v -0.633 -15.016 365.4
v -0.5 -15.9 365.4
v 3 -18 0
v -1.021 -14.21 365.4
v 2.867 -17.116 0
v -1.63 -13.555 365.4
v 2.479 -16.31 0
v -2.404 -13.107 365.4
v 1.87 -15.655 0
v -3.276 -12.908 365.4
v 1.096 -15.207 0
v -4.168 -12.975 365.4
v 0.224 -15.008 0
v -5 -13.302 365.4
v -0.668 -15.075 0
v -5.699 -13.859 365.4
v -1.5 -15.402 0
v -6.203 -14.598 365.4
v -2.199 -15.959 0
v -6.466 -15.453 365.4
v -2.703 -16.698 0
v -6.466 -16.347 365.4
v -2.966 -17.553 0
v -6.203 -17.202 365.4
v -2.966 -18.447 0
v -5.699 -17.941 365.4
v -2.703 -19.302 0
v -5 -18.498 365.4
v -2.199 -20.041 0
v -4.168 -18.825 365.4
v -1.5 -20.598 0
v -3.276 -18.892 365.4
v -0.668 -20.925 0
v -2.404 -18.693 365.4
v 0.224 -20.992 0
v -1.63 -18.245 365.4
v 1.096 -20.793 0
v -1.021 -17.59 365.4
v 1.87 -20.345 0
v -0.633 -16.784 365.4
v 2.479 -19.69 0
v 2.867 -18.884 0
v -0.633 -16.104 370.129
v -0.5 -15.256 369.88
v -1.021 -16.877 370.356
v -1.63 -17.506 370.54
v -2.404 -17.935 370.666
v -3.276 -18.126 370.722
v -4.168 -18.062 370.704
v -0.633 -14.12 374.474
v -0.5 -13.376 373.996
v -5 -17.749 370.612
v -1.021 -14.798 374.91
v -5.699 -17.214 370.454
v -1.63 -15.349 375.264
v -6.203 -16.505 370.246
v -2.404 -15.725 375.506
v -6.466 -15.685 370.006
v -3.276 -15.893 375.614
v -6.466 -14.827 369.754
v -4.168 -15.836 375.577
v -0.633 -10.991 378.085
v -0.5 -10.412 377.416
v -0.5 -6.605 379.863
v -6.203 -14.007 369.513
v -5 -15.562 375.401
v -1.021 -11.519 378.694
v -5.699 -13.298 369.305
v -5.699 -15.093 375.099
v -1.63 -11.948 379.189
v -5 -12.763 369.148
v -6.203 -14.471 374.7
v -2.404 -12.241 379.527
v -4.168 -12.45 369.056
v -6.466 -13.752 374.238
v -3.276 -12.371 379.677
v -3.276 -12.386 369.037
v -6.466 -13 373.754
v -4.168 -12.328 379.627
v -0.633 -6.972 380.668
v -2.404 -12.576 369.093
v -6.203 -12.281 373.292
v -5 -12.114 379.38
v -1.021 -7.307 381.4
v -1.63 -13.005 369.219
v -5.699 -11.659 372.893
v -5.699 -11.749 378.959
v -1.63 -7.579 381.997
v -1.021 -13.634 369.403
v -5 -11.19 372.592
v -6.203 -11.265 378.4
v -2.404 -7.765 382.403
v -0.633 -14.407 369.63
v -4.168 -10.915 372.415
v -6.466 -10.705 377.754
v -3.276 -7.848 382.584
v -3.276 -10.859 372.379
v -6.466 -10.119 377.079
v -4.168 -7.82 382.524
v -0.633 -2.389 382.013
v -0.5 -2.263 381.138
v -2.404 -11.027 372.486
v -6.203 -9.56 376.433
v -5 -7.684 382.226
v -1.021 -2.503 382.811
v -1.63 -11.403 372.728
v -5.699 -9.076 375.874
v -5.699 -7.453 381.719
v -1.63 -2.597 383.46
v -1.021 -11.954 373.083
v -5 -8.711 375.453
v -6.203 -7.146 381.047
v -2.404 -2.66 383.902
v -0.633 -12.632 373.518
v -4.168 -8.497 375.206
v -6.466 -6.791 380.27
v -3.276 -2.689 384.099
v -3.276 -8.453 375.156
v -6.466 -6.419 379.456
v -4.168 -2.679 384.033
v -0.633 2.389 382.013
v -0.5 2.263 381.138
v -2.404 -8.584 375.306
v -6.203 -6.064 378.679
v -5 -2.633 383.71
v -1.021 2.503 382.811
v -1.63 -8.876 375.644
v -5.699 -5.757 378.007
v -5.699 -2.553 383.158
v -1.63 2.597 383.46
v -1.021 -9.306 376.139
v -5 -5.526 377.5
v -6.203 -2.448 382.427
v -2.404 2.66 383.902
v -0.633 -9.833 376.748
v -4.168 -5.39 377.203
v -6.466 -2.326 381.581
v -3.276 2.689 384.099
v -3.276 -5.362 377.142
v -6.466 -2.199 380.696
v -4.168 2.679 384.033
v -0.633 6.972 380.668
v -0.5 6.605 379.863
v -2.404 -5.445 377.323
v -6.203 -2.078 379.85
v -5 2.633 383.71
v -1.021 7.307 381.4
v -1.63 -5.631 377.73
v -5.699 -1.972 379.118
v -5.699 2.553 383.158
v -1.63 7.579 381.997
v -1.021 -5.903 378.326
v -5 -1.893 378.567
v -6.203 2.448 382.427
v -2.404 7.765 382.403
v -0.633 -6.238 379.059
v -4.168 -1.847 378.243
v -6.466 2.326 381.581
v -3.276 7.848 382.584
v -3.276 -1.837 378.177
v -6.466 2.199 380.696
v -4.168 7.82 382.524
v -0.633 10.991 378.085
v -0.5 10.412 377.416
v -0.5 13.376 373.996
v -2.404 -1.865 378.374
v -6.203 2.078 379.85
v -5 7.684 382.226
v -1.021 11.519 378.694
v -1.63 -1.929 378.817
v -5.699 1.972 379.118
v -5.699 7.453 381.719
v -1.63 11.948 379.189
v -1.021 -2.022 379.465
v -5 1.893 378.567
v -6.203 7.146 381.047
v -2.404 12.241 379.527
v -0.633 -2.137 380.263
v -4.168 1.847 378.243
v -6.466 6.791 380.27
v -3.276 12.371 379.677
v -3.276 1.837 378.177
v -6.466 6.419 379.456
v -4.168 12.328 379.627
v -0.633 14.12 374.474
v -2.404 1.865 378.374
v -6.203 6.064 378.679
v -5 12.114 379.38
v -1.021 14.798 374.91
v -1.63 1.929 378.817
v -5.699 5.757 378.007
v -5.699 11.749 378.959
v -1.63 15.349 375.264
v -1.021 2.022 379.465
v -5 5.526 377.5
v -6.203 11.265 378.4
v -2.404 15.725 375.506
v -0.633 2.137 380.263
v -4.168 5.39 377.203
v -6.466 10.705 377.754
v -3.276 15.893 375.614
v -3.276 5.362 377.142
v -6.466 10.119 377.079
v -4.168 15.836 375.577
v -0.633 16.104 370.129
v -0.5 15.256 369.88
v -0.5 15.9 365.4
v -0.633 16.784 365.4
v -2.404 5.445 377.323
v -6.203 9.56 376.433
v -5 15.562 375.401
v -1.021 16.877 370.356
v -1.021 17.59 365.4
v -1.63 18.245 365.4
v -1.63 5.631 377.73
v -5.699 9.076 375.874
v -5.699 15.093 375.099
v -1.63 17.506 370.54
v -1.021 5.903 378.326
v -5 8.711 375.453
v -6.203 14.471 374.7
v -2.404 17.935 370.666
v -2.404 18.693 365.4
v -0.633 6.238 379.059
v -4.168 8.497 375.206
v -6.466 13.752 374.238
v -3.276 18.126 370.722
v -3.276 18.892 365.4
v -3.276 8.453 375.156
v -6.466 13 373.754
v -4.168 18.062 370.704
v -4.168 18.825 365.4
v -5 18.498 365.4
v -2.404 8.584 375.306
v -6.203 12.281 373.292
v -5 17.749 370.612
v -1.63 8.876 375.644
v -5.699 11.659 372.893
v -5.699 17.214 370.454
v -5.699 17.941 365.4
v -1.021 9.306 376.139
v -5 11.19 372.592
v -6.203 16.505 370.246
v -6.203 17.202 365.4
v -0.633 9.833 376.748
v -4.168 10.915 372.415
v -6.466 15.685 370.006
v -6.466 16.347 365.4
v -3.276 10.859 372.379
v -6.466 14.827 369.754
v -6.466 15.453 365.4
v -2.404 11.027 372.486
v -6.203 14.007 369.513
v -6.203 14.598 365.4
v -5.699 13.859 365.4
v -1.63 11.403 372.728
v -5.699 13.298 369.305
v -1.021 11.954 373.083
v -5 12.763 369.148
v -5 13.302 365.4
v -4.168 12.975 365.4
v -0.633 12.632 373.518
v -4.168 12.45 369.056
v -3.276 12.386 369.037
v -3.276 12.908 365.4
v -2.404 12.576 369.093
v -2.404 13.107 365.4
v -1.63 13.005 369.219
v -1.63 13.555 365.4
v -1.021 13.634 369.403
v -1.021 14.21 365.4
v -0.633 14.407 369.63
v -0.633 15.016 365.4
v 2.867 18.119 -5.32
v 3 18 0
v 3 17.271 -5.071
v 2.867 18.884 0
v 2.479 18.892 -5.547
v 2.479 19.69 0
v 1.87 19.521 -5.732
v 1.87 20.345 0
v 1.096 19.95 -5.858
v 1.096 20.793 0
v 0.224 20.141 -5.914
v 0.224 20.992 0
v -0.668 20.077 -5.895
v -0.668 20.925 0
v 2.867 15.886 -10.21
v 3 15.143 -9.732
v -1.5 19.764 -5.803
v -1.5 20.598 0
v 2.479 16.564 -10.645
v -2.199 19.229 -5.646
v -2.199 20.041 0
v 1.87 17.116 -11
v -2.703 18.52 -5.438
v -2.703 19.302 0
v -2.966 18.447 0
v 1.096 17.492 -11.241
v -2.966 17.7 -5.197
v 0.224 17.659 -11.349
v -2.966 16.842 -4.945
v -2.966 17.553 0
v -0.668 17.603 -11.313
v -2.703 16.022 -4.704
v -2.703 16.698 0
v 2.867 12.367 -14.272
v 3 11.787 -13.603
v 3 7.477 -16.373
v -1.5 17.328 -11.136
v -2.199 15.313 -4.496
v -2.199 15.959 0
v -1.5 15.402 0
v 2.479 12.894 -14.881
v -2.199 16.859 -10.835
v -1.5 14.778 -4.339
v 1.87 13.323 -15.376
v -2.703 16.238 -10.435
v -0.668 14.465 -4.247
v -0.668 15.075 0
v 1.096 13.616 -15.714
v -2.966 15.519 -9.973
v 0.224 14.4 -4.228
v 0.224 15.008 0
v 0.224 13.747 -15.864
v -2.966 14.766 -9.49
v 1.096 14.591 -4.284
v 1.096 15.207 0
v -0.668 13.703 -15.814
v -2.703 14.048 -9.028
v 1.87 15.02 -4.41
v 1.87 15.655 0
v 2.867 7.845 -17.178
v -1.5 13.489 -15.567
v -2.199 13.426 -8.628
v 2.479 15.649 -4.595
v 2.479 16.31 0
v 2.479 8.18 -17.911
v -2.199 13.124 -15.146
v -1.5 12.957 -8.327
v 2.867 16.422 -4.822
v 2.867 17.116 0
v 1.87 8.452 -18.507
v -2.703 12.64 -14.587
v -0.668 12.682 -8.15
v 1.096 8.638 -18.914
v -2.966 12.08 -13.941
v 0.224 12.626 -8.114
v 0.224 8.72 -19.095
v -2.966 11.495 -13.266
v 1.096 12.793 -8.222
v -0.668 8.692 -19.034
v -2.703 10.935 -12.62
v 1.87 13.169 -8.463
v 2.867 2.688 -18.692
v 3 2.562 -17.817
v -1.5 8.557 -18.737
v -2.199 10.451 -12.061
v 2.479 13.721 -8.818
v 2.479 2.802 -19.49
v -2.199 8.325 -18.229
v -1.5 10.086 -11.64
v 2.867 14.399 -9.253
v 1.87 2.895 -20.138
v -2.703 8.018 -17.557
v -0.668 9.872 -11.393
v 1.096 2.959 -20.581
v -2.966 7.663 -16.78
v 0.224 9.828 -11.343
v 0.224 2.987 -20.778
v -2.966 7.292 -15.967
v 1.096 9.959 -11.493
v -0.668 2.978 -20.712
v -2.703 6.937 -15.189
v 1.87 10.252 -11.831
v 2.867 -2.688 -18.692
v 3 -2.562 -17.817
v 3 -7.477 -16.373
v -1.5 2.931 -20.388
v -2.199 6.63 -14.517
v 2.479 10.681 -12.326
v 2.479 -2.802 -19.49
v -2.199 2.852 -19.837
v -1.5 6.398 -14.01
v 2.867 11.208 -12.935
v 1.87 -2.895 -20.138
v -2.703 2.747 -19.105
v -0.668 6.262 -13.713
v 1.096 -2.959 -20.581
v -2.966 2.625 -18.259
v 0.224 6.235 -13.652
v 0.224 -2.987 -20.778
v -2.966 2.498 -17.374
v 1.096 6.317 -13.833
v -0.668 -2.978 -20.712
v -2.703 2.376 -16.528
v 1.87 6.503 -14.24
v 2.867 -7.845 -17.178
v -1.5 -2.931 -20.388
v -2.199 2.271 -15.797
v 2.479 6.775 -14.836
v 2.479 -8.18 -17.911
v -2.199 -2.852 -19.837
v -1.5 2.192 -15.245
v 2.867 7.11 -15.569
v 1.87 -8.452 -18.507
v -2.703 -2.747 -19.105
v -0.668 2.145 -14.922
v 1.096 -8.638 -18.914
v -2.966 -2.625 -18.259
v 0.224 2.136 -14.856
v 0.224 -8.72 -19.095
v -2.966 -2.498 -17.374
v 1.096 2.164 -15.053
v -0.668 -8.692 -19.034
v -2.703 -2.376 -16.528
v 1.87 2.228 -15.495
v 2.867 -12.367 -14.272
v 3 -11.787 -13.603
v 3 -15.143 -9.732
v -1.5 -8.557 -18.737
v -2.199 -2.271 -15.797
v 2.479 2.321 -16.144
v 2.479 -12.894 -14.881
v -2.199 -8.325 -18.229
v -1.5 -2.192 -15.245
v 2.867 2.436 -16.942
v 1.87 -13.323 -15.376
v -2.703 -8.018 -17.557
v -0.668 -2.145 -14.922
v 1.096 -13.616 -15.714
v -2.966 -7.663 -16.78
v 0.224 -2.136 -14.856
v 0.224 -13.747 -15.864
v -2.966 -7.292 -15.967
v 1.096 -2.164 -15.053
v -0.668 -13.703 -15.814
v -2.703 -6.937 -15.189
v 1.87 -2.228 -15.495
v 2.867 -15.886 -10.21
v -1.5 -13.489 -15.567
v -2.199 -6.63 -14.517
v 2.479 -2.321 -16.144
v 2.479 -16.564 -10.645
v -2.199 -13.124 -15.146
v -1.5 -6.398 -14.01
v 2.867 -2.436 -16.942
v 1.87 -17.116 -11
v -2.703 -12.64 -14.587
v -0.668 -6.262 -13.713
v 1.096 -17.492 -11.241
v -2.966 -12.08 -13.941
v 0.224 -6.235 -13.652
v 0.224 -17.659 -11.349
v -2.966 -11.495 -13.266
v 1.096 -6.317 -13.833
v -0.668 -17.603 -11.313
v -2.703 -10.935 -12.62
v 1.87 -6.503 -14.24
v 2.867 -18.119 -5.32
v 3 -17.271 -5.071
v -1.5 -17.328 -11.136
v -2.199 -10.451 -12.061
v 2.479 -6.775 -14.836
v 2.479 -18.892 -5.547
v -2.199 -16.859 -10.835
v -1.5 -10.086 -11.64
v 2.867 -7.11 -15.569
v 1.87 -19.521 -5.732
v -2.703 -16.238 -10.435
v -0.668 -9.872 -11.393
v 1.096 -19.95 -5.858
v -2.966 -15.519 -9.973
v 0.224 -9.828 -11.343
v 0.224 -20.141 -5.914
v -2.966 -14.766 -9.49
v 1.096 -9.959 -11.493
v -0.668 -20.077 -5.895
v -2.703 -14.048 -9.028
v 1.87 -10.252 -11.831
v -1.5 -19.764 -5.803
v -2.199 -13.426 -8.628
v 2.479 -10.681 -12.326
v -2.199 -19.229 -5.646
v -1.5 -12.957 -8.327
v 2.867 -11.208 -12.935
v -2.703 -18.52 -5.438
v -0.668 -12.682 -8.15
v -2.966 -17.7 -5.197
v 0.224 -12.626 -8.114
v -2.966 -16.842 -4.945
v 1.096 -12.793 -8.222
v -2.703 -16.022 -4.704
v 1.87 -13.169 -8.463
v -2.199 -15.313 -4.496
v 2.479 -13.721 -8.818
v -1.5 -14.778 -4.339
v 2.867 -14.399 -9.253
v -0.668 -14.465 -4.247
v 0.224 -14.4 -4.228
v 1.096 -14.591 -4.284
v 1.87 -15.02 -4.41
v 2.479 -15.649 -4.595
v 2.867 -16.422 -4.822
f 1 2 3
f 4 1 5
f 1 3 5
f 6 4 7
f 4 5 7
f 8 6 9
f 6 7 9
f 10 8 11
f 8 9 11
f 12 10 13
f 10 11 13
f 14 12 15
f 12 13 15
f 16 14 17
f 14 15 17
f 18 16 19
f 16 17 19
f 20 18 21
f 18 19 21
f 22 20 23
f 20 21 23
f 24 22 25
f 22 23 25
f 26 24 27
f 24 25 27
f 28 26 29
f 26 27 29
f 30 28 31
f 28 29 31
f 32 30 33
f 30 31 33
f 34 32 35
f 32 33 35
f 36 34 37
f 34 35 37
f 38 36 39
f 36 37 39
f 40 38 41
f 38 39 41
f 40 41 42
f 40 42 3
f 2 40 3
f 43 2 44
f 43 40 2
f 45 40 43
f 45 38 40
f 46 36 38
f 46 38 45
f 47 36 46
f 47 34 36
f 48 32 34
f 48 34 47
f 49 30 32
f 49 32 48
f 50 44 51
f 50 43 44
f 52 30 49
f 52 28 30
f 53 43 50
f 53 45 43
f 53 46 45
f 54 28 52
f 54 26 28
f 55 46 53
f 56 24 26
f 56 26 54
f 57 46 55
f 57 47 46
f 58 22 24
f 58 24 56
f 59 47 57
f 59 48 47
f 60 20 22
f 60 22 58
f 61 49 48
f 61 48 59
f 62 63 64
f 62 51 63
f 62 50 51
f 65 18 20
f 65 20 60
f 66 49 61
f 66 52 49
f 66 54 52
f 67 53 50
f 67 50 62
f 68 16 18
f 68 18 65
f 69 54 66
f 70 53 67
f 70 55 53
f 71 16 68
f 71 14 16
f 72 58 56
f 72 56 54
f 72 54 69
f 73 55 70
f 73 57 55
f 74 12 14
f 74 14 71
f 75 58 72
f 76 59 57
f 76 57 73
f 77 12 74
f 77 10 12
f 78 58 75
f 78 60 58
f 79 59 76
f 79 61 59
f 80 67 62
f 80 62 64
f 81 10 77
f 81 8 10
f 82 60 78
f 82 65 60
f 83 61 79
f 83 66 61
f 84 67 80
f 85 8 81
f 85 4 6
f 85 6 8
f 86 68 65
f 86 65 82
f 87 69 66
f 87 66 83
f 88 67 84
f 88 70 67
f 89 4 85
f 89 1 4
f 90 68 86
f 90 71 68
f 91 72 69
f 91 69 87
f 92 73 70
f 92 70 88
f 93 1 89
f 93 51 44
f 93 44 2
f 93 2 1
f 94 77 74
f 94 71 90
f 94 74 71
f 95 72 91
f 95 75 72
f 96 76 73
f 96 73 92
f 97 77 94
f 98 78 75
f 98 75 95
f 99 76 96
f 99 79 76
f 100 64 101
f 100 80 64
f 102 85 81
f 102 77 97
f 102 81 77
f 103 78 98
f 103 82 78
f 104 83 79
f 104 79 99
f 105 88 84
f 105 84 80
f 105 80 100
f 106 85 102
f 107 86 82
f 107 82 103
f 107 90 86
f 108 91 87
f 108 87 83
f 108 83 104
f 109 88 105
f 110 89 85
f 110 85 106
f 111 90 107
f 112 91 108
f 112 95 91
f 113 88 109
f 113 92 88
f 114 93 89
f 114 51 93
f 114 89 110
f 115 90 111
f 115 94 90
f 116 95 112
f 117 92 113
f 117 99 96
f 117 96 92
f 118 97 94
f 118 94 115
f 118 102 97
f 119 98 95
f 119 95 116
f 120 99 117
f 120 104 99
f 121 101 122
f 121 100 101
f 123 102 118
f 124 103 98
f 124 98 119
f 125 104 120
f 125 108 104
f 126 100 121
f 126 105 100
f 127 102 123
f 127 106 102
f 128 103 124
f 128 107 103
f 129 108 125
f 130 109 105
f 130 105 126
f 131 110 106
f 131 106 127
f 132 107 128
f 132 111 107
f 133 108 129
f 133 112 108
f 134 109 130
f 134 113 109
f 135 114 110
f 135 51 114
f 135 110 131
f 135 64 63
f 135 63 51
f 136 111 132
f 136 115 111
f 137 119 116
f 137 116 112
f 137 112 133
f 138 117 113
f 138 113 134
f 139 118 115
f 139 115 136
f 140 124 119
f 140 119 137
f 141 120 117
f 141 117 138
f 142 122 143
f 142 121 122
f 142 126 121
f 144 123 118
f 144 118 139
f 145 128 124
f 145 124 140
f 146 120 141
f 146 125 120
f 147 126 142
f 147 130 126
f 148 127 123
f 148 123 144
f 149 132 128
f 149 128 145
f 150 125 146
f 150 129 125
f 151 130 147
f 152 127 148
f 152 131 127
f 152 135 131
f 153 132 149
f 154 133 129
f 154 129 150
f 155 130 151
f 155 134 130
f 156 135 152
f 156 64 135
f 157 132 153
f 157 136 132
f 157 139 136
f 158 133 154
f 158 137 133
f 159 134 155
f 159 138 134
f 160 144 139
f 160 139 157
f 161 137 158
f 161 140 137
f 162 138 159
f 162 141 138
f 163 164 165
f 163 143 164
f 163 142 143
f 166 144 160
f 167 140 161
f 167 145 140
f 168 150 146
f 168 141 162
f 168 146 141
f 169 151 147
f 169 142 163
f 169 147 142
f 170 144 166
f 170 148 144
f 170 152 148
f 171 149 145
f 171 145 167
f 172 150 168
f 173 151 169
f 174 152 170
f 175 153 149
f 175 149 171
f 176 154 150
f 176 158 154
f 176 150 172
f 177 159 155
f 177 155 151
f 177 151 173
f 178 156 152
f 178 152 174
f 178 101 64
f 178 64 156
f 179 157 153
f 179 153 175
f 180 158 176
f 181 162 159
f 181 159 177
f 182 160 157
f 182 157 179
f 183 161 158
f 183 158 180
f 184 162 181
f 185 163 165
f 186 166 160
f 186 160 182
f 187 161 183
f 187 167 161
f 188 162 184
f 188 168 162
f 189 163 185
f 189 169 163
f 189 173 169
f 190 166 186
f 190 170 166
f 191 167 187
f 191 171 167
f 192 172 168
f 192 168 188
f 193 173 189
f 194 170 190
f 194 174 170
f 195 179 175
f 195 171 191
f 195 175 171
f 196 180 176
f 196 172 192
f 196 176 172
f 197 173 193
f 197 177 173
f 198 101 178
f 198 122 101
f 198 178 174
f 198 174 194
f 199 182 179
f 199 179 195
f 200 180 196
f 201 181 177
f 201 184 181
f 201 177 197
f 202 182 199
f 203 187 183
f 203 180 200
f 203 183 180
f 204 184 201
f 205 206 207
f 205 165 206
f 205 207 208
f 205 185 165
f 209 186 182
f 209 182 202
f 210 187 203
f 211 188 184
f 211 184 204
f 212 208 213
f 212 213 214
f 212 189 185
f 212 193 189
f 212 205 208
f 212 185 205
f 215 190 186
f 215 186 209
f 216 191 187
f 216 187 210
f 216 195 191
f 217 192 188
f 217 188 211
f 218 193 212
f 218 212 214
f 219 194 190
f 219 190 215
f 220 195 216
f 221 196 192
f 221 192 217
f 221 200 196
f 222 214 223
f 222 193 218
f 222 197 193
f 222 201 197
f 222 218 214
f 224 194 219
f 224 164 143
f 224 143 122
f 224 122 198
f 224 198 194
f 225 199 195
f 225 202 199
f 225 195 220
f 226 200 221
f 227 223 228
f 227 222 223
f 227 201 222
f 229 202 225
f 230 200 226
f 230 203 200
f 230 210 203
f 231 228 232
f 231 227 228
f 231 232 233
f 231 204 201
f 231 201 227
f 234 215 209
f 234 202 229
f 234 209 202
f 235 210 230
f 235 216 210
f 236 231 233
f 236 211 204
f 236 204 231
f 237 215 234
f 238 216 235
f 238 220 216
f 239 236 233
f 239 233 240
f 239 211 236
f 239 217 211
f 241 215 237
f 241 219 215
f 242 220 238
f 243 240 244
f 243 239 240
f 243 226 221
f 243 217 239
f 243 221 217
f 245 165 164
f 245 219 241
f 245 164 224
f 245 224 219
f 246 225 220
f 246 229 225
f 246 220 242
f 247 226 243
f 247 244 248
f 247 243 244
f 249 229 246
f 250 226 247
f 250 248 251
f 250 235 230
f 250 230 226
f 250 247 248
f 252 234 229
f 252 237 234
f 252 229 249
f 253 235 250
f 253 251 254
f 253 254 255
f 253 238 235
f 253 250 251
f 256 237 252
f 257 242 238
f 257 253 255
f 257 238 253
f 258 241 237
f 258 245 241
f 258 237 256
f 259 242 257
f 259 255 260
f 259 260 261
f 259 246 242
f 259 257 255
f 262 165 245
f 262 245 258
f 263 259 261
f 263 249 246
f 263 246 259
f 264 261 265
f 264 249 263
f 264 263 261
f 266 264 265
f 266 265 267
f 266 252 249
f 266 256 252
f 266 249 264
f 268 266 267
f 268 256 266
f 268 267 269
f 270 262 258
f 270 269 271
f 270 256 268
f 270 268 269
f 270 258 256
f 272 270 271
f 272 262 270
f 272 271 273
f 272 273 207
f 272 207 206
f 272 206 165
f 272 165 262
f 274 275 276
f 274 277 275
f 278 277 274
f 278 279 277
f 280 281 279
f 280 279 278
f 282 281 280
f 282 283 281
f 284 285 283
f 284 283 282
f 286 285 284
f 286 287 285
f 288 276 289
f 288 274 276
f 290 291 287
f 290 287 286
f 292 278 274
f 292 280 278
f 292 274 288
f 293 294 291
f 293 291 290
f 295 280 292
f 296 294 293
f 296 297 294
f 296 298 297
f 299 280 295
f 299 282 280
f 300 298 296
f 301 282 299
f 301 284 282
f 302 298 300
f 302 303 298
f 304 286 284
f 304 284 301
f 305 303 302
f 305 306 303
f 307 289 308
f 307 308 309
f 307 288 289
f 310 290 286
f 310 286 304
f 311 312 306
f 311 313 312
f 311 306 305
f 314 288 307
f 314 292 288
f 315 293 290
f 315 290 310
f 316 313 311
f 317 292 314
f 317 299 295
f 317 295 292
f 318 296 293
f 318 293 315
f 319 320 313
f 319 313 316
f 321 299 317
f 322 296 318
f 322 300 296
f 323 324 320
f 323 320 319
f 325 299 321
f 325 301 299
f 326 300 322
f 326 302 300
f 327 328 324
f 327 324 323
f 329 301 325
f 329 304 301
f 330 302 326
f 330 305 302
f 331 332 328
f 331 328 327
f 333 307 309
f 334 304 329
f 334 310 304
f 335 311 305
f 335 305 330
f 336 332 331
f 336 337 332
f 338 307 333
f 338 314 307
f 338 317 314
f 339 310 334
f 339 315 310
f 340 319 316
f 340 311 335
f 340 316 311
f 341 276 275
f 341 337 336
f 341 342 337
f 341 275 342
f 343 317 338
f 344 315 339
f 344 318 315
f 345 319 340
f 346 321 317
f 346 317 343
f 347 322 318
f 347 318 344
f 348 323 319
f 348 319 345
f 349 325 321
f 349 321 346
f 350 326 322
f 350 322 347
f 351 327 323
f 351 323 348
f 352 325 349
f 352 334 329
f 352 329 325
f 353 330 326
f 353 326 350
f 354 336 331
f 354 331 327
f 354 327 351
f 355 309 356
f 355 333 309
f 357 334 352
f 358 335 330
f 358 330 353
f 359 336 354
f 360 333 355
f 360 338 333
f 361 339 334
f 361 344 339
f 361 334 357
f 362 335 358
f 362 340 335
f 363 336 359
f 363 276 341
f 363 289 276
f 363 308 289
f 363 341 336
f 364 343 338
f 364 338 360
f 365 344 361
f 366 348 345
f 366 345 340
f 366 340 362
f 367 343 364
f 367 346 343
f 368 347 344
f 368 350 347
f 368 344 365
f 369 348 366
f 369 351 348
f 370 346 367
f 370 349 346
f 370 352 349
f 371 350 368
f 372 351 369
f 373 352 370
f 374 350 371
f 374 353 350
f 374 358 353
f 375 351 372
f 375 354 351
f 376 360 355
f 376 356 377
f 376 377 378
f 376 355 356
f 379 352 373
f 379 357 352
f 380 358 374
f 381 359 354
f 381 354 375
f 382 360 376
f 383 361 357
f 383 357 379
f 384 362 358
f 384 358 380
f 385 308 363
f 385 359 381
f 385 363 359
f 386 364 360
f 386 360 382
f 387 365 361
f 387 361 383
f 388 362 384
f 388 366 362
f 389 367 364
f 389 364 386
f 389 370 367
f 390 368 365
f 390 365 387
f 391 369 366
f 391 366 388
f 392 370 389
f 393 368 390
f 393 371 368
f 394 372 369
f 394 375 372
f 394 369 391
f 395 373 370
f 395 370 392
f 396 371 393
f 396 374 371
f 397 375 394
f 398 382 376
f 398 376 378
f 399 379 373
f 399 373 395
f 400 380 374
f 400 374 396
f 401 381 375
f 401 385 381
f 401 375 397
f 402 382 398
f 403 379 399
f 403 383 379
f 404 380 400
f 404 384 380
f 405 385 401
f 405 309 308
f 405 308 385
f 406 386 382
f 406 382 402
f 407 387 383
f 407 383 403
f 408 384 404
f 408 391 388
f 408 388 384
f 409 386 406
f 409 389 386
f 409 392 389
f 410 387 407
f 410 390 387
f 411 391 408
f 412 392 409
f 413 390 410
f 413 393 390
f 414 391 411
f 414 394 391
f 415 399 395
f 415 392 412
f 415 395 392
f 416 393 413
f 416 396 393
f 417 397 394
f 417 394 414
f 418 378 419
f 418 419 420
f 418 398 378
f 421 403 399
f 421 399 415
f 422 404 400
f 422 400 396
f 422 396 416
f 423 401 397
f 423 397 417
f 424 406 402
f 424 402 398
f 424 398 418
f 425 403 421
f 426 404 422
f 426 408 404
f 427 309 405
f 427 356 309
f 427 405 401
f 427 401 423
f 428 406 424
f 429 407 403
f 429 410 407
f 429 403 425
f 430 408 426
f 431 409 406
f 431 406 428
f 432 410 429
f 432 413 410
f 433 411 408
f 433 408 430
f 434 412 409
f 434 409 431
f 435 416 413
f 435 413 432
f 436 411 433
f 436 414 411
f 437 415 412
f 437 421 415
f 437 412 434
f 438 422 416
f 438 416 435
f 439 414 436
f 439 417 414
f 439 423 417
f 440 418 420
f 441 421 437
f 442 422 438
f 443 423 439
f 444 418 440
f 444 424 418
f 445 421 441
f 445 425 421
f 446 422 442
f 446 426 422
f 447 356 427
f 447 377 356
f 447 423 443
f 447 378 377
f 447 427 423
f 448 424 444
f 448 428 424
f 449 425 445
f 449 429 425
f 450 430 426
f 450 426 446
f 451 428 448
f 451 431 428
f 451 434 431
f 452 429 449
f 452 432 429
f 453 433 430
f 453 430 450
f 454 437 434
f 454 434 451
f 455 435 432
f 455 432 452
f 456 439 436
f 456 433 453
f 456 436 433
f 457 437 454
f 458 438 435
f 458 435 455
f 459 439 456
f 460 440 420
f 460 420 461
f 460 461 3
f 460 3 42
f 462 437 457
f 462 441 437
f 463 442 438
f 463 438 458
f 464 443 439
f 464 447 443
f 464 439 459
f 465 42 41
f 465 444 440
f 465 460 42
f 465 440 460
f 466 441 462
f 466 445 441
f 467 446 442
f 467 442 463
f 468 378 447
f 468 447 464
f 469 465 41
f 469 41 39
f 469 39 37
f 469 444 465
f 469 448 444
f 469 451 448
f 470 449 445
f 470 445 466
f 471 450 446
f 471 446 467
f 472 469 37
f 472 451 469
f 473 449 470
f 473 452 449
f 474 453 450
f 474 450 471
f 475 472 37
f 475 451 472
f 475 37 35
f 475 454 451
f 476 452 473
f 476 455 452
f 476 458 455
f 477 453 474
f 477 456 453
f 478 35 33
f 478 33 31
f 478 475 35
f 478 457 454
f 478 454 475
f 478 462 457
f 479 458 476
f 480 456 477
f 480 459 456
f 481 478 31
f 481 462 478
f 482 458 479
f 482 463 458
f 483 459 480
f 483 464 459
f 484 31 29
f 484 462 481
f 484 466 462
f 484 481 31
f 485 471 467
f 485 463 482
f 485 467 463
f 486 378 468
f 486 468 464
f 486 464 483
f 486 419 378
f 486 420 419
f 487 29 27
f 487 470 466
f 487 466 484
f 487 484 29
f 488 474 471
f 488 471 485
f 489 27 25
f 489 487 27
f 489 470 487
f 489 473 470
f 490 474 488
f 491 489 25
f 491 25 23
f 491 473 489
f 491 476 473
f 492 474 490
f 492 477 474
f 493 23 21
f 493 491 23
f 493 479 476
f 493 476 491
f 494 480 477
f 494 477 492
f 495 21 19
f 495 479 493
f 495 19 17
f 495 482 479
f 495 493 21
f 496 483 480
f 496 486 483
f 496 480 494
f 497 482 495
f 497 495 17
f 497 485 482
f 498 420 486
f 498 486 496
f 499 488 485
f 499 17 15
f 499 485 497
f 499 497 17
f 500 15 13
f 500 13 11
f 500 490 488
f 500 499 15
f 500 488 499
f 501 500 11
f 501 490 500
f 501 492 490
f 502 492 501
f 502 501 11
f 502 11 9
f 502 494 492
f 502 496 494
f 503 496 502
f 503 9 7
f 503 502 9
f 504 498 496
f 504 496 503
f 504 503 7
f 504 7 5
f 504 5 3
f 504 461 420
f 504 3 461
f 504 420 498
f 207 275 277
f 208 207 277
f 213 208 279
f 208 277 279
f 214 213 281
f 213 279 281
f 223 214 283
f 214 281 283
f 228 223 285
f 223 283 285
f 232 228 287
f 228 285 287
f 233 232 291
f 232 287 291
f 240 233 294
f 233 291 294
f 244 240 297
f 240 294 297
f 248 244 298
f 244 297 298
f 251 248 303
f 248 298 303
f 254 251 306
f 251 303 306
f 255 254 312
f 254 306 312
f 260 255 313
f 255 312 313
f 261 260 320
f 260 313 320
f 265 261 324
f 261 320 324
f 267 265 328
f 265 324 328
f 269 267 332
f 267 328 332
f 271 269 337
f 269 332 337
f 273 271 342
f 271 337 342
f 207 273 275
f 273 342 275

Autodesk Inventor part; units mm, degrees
ref_plane "YZ Plane" through (0, 0, 0) normal (1, 0, 0) x (0, 1, 0)
ref_plane "XZ Plane" through (0, 0, 0) normal (0, 1, 0) x (-1, 0, 0)
sketch "Sketch1" plane through (0, 0, 0) normal (0, 0, 1) x (1, 0, 0)
  line L0 (0, 0) -> (17.1365, 0)
  line L1 (0, 0) -> (0, 18) construction
  line L2 (0, 0) -> (0, -18) construction
  circle A0 centre (0, 18) radius 3
  circle A1 centre (0, -18) radius 3
  dimension "d0" = 18
  dimension "d1" = 18
  dimension "d2" = 6
  dimension "d3" = 6
ref_plane "Work Plane1" through (0, 0, 365.4) normal (0, 0, 1) x (1, 0, 0)
sketch "Sketch3" plane through (0, 0, 365.4) normal (0, 0, 1) x (1, 0, 0)
  line L0 (-3.5, 0) -> (-3.5, 15.9) construction
  line L1 (-3.5, 0) -> (-3.5, -15.9) construction
  circle A0 centre (-3.5, 15.9) radius 3
  circle A1 centre (-3.5, -15.9) radius 3
  line L2 (0, 0) -> (-3.5, 0)
  dimension "d8" = 15.9
  dimension "d9" = 15.9
  dimension "d10" = 6
  dimension "d11" = 6
  dimension "d17" = 3.5
revolve "Revolution1" add sketch "Sketch1" angle 180 about axis through (0, 0, 0) along (-1, 0, 0) contours A0
sketch3d "3D Sketch1"
  line L0 (-3.5, 15.9, 365.4) -> (0, 18, 0)
sweep "Sweep1" add profiles "Sketch3" path "3D Sketch1" contours A0
sketch3d "3D Sketch1 for Sweep2"
  line L0 (-3.5, -15.9, 365.4) -> (0, -18, 0)
sweep "Sweep2" add profiles "Sketch3" path "3D Sketch1 for Sweep2" contours A1
revolve "Revolution2" add sketch "Sketch3" angle 180 about axis through (0, 0, 365.4) along (1, 0, 0) contours A0
equation "\"d8\" = d9"
properties part number "RoundBelt" material "PAEK Plastic"
